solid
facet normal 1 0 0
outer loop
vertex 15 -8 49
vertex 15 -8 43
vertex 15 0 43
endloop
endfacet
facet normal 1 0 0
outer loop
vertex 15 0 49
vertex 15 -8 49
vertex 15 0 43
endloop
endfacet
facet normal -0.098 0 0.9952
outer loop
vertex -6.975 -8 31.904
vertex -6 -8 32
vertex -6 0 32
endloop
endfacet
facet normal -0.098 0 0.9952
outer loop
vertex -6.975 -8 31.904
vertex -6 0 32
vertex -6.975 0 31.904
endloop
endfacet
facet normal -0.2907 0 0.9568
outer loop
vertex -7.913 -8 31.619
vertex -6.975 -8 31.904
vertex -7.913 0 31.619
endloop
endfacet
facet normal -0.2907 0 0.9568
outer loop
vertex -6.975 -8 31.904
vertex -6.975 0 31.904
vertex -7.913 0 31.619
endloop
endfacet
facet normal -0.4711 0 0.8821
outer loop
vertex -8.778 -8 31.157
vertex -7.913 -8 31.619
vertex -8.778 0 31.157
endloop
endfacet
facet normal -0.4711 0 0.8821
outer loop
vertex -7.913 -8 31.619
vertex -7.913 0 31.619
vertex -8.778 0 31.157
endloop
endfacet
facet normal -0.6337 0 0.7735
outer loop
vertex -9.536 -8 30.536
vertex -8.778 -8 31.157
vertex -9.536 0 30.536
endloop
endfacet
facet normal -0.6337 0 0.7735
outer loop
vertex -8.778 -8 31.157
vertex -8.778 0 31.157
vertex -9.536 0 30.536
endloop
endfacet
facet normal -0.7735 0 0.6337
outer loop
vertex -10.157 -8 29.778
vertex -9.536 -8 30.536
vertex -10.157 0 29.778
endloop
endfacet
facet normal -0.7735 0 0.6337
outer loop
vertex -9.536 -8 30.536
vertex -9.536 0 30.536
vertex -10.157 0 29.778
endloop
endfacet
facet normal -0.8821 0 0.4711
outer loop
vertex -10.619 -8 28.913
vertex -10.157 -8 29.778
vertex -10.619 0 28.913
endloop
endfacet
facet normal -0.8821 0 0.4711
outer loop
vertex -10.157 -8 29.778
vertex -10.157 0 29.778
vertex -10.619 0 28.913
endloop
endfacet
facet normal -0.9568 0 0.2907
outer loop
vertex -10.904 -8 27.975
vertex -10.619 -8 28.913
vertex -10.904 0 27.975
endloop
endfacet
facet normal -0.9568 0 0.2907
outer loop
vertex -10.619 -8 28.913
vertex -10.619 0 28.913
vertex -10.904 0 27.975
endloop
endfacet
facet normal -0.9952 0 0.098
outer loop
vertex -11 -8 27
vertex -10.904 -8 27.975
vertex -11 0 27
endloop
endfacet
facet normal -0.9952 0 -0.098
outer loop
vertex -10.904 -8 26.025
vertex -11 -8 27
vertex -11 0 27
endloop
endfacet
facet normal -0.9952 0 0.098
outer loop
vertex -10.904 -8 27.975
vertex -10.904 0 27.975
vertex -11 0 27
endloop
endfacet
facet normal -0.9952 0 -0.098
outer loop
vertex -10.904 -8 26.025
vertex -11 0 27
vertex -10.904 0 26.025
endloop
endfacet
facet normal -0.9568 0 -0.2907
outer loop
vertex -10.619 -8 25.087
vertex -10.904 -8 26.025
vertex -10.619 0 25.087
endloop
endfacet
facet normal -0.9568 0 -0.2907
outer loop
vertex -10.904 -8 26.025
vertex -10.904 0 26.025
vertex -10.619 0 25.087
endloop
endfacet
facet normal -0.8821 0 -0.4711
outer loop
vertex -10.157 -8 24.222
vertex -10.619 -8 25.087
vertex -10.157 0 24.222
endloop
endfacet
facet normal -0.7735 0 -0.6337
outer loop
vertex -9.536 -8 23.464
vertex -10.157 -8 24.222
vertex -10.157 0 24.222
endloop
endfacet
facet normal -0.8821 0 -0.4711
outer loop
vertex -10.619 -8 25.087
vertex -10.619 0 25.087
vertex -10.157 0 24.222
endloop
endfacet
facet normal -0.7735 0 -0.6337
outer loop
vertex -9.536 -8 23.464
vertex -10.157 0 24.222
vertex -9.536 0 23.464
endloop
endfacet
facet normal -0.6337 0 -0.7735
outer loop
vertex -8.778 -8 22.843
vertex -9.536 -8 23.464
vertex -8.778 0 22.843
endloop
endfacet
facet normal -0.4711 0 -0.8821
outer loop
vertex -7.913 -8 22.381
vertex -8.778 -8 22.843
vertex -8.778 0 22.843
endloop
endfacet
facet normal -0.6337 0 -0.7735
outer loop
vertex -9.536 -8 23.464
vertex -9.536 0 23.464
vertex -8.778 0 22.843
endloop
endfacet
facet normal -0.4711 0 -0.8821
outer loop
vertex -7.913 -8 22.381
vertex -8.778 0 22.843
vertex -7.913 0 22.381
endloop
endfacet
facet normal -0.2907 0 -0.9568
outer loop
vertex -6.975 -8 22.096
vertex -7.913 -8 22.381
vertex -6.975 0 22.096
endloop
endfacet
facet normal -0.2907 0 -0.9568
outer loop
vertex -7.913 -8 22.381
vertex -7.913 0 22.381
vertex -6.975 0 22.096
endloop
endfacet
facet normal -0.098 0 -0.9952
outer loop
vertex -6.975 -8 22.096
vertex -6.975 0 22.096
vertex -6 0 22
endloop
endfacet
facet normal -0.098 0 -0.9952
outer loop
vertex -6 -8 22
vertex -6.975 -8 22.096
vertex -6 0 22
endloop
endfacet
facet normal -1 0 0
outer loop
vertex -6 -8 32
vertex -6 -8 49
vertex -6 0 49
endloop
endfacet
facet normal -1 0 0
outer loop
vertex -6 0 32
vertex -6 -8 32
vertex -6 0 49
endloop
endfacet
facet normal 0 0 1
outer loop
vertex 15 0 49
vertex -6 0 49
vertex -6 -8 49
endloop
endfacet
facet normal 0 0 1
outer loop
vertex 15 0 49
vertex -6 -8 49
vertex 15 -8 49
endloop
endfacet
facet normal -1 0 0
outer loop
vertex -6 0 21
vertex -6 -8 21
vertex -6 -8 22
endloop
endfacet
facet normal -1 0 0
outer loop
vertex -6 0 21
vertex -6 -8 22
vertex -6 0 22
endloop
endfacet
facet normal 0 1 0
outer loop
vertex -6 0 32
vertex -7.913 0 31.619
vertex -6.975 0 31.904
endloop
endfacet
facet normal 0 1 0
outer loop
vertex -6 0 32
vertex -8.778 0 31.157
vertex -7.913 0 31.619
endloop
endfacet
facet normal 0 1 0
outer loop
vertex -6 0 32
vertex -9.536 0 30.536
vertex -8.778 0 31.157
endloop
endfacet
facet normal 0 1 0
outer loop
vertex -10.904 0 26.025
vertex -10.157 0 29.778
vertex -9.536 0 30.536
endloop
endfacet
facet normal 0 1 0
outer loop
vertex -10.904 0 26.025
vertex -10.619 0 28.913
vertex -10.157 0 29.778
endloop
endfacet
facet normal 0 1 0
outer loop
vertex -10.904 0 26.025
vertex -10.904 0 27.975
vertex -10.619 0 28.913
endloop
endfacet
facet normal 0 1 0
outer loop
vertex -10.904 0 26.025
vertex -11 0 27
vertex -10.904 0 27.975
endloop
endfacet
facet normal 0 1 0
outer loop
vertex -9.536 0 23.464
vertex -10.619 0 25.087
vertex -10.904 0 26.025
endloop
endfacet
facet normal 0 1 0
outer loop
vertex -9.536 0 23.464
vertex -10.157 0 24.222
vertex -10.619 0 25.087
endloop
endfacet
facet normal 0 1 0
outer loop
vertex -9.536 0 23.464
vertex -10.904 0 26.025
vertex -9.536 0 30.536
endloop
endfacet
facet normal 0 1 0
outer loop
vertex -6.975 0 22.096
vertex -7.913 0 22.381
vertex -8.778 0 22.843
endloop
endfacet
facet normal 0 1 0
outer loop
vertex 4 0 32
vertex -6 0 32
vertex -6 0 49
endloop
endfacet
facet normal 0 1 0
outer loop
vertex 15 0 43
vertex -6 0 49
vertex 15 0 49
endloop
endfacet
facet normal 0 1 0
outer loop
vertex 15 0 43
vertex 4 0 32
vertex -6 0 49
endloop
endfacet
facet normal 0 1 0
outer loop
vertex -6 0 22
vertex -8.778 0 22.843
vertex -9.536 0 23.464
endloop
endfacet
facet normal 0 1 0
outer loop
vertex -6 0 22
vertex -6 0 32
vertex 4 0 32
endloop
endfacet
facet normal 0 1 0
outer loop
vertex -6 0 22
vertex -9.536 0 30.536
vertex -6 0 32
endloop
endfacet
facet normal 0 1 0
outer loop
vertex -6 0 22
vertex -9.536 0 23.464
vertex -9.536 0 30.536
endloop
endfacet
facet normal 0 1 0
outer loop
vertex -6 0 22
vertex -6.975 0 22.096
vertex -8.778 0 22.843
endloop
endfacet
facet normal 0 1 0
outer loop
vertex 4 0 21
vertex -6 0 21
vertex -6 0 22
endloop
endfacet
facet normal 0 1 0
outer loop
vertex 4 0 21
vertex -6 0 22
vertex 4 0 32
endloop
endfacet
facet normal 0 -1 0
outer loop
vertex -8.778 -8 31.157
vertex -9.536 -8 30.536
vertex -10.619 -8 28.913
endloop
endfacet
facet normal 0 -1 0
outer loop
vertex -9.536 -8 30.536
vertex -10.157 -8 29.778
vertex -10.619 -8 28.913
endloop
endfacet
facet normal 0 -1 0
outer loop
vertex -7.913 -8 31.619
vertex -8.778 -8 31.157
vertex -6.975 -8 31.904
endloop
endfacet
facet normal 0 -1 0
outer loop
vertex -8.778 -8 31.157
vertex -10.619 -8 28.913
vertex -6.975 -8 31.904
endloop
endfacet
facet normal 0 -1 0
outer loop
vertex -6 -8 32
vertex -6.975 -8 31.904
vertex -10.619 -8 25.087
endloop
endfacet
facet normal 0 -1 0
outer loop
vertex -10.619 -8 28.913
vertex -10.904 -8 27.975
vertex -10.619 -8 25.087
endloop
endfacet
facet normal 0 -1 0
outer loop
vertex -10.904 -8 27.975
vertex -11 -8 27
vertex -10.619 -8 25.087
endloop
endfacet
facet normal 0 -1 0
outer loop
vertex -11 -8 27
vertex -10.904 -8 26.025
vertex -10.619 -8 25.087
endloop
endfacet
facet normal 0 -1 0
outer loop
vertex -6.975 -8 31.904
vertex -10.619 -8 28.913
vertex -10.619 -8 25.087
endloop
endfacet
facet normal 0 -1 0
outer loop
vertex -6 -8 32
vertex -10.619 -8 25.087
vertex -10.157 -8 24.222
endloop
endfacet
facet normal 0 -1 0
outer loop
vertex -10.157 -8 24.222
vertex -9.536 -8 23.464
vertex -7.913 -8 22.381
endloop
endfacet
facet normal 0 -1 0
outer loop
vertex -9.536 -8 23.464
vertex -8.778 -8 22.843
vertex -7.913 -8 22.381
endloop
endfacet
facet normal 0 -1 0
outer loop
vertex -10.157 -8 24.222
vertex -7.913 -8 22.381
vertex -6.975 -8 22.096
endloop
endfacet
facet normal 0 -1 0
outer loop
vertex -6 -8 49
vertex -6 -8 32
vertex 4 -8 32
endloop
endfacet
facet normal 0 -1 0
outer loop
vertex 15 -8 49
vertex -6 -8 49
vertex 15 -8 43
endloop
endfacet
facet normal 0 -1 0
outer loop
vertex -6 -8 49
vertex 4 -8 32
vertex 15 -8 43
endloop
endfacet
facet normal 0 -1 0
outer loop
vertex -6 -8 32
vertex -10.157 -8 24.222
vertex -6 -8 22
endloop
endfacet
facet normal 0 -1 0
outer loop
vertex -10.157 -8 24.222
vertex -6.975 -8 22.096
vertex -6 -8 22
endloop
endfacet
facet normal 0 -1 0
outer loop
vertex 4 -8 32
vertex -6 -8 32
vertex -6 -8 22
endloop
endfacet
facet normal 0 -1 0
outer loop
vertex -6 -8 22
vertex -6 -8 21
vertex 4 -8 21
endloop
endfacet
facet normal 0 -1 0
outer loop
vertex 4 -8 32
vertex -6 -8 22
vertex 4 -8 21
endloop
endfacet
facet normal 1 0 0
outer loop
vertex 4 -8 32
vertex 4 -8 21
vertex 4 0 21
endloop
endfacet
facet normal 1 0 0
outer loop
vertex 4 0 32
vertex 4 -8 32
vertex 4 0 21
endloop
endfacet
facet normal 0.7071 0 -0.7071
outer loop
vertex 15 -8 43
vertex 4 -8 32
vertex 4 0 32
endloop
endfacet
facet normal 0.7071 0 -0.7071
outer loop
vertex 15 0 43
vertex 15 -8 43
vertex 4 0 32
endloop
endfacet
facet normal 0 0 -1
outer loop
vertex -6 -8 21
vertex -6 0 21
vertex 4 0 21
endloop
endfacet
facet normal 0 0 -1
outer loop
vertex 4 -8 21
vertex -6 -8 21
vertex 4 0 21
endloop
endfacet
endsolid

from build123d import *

# Parameters (mm, degrees)
CYLINDER189_R               = 5
CYLINDER189_DEPTH           = 8
CYLINDER189_ROLL_ANGLE      = 90
BOX001027045139_W           = 21
BOX001027045139_H           = 10
BOX001027045139_DEPTH       = 28
BOX001027045139_PITCH_ANGLE = 45
BOX001027045138_W           = 21
BOX001027045138_H           = 10
BOX001027045138_DEPTH       = 28
BOX001027045137_W           = 21
BOX001027045137_H           = 8
BOX001027045137_DEPTH       = 28


with BuildPart() as screw_bump_top:
    # Cylinder189 → Cylinder189 (new body)
    with BuildSketch(Plane.XY):
        Circle(CYLINDER189_R)
    extrude(amount=CYLINDER189_DEPTH)


with BuildPart() as screw_bump_top_1:
    # Cylinder189 roll: moved
    add(screw_bump_top.part.rotate(Axis((0, 0, 0), (1, 0, 0)), CYLINDER189_ROLL_ANGLE))


with BuildPart() as screw_bump_top_2:
    # Cylinder189 placement: moved
    add(screw_bump_top_1.part.moved(Location((-6, 0, -1))))


with BuildPart() as cube192:
    # Box001027045139 → Box001027045139 (new body)
    with BuildSketch(Plane.XY):
        with Locations((10.5, 5)):
            Rectangle(BOX001027045139_W, BOX001027045139_H)
    extrude(amount=BOX001027045139_DEPTH)


with BuildPart() as cube192_1:
    # Box001027045139 pitch: moved
    add(cube192.part.rotate(Axis((0, 0, 0), (0, 1, 0)), BOX001027045139_PITCH_ANGLE))


with BuildPart() as cube192_2:
    # Box001027045139 placement: moved
    add(cube192_1.part.moved(Location((-6, -9, 21))))


with BuildPart() as fusion112087:
    # Box001027045138 → Box001027045138 (new body)
    with BuildSketch(Plane(origin=(-6, -9, -7), x_dir=(1, 0, 0), z_dir=(0, 0, 1))):
        with Locations((10.5, 5)):
            Rectangle(BOX001027045138_W, BOX001027045138_H)
    extrude(amount=BOX001027045138_DEPTH)

    # Fusion112087: union Cube192
    add(cube192_2.part)


with BuildPart() as fusion112087_1:
    # Fusion112087 placement: moved
    add(fusion112087.part.moved(Location((10, 0, -17))))


with BuildPart() as top_ghost:
    # Box001027045137 → Box001027045137 (new body)
    with BuildSketch(Plane(origin=(-6, -8, -7), x_dir=(1, 0, 0), z_dir=(0, 0, 1))):
        with Locations((10.5, 4)):
            Rectangle(BOX001027045137_W, BOX001027045137_H)
    extrude(amount=BOX001027045137_DEPTH)

    # Cut160: cut Fusion112087
    add(fusion112087_1.part, mode=Mode.SUBTRACT)

    # Fusion112089: union screw-bump-top
    add(screw_bump_top_2.part)


with BuildPart() as top_ghost_1:
    # Fusion112089 placement: moved
    add(top_ghost.part.moved(Location((0, 0, 28))))


solid = top_ghost_1.part
